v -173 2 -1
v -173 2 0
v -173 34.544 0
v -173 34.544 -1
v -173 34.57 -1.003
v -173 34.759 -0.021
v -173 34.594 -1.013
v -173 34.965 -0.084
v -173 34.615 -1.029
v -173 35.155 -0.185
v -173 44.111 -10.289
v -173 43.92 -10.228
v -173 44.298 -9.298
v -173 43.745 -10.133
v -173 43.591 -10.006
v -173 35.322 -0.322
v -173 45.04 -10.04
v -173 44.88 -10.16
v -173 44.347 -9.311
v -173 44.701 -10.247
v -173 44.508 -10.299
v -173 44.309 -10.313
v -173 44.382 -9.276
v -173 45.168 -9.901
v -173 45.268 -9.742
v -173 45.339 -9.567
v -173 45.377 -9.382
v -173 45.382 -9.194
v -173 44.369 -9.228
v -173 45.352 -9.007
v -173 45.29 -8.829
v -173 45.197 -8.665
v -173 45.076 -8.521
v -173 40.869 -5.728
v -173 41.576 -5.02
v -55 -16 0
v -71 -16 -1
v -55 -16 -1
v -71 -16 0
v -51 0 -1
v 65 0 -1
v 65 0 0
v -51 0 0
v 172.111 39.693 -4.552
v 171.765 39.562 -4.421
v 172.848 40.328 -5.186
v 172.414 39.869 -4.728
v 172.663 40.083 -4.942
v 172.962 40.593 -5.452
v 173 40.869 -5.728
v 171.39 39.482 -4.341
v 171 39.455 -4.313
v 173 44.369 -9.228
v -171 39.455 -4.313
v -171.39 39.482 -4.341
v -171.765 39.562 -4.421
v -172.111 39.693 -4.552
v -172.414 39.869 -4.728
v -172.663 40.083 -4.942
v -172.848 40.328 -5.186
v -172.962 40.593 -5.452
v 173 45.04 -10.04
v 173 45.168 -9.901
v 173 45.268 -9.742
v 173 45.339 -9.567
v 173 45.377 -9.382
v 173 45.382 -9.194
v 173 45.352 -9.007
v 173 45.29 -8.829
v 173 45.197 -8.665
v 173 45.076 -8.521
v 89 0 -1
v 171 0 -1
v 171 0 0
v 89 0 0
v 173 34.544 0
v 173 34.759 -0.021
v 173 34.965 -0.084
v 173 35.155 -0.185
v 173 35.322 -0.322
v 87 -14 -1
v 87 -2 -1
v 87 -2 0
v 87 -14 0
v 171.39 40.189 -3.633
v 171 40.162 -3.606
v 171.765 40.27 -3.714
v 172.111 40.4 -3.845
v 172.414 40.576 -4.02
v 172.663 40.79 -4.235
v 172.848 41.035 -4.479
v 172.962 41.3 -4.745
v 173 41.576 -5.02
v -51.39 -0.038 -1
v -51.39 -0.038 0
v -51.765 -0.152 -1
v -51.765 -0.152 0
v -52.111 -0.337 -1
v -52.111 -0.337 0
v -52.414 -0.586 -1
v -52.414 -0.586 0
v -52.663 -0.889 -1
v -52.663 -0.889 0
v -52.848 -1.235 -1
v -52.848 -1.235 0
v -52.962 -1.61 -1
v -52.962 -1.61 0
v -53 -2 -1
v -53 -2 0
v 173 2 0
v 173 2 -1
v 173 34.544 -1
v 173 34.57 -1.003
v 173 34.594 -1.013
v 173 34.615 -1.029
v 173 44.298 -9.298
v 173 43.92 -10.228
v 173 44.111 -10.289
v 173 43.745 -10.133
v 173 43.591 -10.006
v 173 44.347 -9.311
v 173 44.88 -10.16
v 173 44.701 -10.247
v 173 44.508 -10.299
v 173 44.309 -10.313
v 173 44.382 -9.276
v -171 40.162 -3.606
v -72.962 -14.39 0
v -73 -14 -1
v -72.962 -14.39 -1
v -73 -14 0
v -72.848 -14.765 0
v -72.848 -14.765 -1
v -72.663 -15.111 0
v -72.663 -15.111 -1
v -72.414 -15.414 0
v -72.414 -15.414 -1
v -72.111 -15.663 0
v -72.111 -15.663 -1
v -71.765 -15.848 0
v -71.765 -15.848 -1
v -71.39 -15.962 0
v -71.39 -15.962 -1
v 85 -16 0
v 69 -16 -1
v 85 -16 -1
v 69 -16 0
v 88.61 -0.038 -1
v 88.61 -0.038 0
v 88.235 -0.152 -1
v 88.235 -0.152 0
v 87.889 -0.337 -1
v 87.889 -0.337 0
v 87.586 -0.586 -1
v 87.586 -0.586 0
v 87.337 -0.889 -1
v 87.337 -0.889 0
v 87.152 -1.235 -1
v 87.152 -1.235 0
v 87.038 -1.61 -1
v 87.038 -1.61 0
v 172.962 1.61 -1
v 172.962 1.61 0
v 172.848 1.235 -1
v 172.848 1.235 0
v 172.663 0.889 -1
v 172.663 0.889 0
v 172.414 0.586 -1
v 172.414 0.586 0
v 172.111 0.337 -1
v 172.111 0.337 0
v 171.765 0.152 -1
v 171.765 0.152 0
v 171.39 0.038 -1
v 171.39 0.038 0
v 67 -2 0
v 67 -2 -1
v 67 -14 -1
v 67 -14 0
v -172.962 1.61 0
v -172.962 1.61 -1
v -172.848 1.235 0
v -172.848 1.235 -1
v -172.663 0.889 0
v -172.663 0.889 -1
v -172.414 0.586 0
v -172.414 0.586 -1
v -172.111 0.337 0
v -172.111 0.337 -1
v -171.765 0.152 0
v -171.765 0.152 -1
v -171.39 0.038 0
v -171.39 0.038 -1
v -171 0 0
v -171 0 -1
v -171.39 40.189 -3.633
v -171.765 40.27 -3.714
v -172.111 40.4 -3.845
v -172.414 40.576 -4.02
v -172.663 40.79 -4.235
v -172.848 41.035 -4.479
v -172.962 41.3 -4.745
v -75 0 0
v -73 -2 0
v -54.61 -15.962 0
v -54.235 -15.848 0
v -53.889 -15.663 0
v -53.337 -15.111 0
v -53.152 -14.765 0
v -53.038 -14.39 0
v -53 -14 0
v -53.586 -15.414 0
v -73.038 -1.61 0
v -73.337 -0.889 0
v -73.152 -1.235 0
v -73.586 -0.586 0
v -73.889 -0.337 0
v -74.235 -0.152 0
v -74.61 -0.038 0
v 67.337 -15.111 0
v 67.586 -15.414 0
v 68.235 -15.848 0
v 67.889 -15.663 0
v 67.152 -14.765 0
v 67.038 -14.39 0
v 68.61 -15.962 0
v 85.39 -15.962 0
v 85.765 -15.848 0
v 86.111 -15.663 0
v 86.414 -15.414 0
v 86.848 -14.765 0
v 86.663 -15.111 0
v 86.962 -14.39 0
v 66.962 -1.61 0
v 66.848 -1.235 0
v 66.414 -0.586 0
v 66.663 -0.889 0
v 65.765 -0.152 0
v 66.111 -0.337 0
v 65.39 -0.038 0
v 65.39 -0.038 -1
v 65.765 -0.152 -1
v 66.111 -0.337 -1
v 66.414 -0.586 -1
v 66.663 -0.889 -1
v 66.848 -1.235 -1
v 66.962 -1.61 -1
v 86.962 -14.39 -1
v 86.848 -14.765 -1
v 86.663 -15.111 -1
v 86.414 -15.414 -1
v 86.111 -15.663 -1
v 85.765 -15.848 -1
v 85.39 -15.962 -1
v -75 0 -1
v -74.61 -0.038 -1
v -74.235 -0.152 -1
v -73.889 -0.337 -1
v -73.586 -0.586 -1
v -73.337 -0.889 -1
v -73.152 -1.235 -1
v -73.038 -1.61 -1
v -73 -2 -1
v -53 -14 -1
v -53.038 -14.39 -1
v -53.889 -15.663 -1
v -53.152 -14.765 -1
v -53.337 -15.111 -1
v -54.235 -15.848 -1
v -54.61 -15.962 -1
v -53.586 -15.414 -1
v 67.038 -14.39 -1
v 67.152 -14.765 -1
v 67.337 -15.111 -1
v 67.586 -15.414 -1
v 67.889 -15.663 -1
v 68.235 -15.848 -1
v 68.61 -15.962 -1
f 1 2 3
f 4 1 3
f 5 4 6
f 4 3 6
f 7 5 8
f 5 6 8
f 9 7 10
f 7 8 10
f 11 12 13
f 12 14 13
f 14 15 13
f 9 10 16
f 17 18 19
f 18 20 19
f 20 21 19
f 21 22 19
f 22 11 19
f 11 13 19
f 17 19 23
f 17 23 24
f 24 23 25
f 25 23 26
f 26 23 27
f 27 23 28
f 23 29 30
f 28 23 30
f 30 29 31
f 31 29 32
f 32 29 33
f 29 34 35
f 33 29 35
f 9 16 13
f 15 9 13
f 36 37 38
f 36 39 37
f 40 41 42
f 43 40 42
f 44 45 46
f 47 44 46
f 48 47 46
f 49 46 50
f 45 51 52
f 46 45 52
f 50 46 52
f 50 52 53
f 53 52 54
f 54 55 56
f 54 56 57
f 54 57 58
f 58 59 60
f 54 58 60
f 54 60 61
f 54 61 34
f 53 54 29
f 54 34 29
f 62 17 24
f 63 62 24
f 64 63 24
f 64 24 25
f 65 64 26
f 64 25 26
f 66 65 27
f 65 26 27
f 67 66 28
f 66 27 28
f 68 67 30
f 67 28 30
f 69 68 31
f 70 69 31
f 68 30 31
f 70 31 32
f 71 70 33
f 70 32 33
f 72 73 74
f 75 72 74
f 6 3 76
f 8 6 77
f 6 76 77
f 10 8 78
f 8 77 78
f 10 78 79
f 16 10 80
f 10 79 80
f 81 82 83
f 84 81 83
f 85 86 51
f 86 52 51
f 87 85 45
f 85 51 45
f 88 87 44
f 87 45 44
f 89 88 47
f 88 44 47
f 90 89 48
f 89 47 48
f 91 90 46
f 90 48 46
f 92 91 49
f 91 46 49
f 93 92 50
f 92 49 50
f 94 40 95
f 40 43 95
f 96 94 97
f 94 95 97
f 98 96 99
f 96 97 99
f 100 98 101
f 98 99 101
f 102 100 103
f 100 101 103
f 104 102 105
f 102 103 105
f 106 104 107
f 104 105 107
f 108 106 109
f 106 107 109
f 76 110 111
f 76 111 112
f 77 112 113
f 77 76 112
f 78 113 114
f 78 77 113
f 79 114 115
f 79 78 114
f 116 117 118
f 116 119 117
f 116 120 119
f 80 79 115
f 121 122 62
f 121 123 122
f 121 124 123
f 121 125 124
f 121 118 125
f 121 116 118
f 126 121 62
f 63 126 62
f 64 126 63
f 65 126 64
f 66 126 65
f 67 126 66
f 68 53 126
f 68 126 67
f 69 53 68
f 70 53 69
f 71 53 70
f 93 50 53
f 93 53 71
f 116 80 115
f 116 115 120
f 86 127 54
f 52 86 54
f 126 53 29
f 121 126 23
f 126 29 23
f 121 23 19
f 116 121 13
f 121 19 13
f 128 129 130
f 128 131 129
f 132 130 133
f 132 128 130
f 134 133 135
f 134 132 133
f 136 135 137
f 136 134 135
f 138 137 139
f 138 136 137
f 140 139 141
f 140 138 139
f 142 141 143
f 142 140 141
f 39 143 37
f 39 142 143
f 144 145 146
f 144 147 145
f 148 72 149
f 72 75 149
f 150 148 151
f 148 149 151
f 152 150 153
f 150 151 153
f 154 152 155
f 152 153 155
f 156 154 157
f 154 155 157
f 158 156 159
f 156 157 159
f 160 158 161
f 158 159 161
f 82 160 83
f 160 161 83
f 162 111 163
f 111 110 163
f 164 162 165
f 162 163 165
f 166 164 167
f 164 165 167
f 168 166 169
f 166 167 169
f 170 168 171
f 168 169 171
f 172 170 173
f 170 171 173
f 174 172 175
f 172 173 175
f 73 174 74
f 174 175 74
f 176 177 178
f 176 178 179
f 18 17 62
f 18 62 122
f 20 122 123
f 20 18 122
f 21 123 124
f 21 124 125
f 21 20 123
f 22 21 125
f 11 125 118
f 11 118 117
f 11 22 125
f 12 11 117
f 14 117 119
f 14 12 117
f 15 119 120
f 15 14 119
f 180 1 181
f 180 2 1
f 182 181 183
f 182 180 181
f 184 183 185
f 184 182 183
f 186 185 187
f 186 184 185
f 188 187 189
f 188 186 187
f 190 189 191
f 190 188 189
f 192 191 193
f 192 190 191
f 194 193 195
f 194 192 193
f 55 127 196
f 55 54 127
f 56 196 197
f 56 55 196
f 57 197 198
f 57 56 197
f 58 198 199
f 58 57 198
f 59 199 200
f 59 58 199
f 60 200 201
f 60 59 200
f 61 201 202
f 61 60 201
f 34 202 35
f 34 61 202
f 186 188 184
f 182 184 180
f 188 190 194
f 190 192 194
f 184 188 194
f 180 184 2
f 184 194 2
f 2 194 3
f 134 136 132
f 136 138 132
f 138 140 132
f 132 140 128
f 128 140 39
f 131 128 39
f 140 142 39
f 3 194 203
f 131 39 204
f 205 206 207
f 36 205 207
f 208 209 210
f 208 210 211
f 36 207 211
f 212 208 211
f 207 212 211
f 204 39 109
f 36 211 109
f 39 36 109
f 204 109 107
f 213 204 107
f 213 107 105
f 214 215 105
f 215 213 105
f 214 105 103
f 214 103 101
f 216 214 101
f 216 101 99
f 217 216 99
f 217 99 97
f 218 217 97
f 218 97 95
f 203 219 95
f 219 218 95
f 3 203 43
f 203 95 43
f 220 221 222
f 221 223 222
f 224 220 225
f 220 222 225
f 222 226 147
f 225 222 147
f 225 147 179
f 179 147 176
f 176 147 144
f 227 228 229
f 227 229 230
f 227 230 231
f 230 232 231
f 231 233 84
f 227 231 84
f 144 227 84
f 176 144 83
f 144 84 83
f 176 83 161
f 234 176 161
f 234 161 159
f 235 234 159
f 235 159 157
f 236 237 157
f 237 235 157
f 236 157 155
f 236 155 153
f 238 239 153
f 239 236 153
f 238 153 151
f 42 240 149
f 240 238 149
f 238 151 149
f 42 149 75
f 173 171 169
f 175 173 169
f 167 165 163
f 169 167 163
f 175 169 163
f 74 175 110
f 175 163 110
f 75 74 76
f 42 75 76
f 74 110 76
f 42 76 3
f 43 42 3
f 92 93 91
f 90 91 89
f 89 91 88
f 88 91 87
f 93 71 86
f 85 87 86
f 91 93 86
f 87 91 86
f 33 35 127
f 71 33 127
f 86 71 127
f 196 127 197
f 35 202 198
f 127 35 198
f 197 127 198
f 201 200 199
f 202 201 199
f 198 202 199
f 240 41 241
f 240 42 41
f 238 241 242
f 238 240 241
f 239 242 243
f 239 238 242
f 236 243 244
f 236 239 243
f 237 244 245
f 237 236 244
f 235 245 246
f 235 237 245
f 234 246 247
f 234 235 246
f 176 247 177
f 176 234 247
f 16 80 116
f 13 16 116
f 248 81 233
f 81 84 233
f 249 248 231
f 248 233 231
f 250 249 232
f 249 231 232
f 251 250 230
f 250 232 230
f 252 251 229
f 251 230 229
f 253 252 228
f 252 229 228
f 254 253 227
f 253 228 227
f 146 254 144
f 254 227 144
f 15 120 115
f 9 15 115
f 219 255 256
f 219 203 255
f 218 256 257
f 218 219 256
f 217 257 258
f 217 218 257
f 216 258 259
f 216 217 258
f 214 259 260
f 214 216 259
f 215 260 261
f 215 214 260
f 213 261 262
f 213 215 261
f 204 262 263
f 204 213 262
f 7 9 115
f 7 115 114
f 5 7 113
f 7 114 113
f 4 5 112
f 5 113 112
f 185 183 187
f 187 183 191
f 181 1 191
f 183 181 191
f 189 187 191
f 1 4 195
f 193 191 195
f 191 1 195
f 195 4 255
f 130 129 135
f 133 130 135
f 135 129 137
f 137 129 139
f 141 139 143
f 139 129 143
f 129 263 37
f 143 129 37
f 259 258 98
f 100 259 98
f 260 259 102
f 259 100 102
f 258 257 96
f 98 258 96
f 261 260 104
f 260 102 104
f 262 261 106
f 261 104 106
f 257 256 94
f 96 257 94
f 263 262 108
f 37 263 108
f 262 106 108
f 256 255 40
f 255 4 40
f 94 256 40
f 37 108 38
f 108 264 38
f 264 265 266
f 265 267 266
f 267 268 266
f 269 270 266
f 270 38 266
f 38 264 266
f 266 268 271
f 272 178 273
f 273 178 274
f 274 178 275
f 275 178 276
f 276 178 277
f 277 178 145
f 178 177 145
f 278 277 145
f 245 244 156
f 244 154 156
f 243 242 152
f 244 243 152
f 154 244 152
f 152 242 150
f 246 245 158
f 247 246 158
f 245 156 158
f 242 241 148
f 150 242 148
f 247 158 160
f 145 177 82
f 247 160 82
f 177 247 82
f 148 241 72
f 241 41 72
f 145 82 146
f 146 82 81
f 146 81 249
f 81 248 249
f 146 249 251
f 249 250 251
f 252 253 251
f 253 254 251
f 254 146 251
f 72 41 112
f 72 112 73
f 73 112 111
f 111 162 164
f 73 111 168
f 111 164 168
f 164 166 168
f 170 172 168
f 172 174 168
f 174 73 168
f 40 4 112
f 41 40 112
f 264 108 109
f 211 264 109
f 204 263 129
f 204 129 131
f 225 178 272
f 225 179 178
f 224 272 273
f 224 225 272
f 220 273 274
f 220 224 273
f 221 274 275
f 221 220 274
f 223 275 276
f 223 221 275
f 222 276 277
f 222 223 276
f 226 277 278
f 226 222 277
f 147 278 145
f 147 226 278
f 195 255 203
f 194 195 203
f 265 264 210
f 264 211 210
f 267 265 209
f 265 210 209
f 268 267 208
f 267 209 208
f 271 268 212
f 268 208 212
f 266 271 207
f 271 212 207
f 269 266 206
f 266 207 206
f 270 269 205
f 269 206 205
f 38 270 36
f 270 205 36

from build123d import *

# Parameters (mm, degrees)
BASIS_BLECH1_DEPTH              = 173
BLECHKANTENRAND1_START          = -173
BLECHKANTENRAND1_DEPTH          = 346
BLECHKANTENRAND1_2_DEPTH        = 346
VERRUNDUNG1_R                   = 2
SKIZZE19_W                      = 20
SKIZZE19_H                      = 1
AUFSATZ_LINEAR_AUSTRAGEN1_DEPTH = 16
VERRUNDUNG2_R                   = 2


# Read off the part's stored shape, not the designer's step: Blechkantenrand1
# Sheet-metal steps are written as plain solids
with BuildPart() as part:
    # Skizze1 → Basis-Blech1 (new, symmetric)
    with BuildSketch(Plane(origin=(0, 0, 0), x_dir=(0, 0, -1), z_dir=(1, 0, 0))):
        with BuildLine():
            Line((0, 0), (0, 34.544365081))
            ThreePointArc((0, 34.544365081), (0.083732514, 34.965316857), (0.322182541, 35.322182541))
            Line((0.322182541, 35.322182541), (10.040916293, 45.040916293))
            Line((10.040916293, 45.040916293), (10.748023074, 44.333809512))
            Line((10.748023074, 44.333809512), (1.029289322, 34.61507576))
            ThreePointArc((1.029289322, 34.61507576), (1.007612047, 34.582633425), (1, 34.544365081))
            Line((1, 34.544365081), (1, 0))
            Line((1, 0), (0, 0))
        make_face()
    extrude(amount=BASIS_BLECH1_DEPTH, both=True)

    # Blechkantenrand1 outline → Blechkantenrand1 (cut)
    with BuildSketch(Plane.YZ.offset(BLECHKANTENRAND1_START)):
        with BuildLine():
            Line((45.040916293, -10.040916293), (45.040074021, -10.040074021))
            ThreePointArc((45.040074021, -10.040074021), (44.308802418, -10.312801004), (43.591347391, -10.005560954))
            Line((43.591347391, -10.005560954), (44.333809512, -10.748023074))
            Line((44.333809512, -10.748023074), (45.040916293, -10.040916293))
        make_face()
    extrude(amount=BLECHKANTENRAND1_DEPTH, mode=Mode.SUBTRACT)

    # Blechkantenrand1 2 outline → Blechkantenrand1 2 (add)
    with BuildSketch(Plane.YZ.offset(BLECHKANTENRAND1_START)):
        with BuildLine():
            Line((40.161879503, -3.606244584), (39.454772721, -4.313351365))
            Line((39.454772721, -4.313351365), (44.369164851, -9.227743494))
            ThreePointArc((44.369164851, -9.227743494), (44.369164852, -9.298454172), (44.298454173, -9.298454173))
            Line((44.298454173, -9.298454173), (45.040074021, -10.040074021))
            ThreePointArc((45.040074021, -10.040074021), (45.383511682, -9.288105927), (45.076271632, -8.520636713))
            Line((45.076271632, -8.520636713), (40.161879503, -3.606244584))
        make_face()
    extrude(amount=BLECHKANTENRAND1_2_DEPTH)

    # Verrundung1
    verrundung1_edges = [part.edges().sort_by_distance(p)[0] for p in [
        (173, 0, -0.5),
        (-173, 39.808326112, -3.959797974),
        (173, 39.808326112, -3.959797974),
        (-173, 0, -0.5),
    ]]
    fillet(verrundung1_edges, radius=VERRUNDUNG1_R)

    # Skizze19 → Aufsatz-Linear austragen1 (add)
    with BuildSketch(Plane.XZ):
        with Locations((-63, -0.5)):
            Rectangle(SKIZZE19_W, SKIZZE19_H)
        with Locations((77, -0.5)):
            Rectangle(SKIZZE19_W, SKIZZE19_H)
    extrude(amount=AUFSATZ_LINEAR_AUSTRAGEN1_DEPTH)

    # Verrundung2
    verrundung2_edges = [part.edges().sort_by_distance(p)[0] for p in [
        (-73, 0, -0.5),
        (-53, 0, -0.5),
        (-73, -16, -0.5),
        (-53, -16, -0.5),
        (67, 0, -0.5),
        (87, 0, -0.5),
        (67, -16, -0.5),
        (87, -16, -0.5),
    ]]
    fillet(verrundung2_edges, radius=VERRUNDUNG2_R)


solid = part.part
